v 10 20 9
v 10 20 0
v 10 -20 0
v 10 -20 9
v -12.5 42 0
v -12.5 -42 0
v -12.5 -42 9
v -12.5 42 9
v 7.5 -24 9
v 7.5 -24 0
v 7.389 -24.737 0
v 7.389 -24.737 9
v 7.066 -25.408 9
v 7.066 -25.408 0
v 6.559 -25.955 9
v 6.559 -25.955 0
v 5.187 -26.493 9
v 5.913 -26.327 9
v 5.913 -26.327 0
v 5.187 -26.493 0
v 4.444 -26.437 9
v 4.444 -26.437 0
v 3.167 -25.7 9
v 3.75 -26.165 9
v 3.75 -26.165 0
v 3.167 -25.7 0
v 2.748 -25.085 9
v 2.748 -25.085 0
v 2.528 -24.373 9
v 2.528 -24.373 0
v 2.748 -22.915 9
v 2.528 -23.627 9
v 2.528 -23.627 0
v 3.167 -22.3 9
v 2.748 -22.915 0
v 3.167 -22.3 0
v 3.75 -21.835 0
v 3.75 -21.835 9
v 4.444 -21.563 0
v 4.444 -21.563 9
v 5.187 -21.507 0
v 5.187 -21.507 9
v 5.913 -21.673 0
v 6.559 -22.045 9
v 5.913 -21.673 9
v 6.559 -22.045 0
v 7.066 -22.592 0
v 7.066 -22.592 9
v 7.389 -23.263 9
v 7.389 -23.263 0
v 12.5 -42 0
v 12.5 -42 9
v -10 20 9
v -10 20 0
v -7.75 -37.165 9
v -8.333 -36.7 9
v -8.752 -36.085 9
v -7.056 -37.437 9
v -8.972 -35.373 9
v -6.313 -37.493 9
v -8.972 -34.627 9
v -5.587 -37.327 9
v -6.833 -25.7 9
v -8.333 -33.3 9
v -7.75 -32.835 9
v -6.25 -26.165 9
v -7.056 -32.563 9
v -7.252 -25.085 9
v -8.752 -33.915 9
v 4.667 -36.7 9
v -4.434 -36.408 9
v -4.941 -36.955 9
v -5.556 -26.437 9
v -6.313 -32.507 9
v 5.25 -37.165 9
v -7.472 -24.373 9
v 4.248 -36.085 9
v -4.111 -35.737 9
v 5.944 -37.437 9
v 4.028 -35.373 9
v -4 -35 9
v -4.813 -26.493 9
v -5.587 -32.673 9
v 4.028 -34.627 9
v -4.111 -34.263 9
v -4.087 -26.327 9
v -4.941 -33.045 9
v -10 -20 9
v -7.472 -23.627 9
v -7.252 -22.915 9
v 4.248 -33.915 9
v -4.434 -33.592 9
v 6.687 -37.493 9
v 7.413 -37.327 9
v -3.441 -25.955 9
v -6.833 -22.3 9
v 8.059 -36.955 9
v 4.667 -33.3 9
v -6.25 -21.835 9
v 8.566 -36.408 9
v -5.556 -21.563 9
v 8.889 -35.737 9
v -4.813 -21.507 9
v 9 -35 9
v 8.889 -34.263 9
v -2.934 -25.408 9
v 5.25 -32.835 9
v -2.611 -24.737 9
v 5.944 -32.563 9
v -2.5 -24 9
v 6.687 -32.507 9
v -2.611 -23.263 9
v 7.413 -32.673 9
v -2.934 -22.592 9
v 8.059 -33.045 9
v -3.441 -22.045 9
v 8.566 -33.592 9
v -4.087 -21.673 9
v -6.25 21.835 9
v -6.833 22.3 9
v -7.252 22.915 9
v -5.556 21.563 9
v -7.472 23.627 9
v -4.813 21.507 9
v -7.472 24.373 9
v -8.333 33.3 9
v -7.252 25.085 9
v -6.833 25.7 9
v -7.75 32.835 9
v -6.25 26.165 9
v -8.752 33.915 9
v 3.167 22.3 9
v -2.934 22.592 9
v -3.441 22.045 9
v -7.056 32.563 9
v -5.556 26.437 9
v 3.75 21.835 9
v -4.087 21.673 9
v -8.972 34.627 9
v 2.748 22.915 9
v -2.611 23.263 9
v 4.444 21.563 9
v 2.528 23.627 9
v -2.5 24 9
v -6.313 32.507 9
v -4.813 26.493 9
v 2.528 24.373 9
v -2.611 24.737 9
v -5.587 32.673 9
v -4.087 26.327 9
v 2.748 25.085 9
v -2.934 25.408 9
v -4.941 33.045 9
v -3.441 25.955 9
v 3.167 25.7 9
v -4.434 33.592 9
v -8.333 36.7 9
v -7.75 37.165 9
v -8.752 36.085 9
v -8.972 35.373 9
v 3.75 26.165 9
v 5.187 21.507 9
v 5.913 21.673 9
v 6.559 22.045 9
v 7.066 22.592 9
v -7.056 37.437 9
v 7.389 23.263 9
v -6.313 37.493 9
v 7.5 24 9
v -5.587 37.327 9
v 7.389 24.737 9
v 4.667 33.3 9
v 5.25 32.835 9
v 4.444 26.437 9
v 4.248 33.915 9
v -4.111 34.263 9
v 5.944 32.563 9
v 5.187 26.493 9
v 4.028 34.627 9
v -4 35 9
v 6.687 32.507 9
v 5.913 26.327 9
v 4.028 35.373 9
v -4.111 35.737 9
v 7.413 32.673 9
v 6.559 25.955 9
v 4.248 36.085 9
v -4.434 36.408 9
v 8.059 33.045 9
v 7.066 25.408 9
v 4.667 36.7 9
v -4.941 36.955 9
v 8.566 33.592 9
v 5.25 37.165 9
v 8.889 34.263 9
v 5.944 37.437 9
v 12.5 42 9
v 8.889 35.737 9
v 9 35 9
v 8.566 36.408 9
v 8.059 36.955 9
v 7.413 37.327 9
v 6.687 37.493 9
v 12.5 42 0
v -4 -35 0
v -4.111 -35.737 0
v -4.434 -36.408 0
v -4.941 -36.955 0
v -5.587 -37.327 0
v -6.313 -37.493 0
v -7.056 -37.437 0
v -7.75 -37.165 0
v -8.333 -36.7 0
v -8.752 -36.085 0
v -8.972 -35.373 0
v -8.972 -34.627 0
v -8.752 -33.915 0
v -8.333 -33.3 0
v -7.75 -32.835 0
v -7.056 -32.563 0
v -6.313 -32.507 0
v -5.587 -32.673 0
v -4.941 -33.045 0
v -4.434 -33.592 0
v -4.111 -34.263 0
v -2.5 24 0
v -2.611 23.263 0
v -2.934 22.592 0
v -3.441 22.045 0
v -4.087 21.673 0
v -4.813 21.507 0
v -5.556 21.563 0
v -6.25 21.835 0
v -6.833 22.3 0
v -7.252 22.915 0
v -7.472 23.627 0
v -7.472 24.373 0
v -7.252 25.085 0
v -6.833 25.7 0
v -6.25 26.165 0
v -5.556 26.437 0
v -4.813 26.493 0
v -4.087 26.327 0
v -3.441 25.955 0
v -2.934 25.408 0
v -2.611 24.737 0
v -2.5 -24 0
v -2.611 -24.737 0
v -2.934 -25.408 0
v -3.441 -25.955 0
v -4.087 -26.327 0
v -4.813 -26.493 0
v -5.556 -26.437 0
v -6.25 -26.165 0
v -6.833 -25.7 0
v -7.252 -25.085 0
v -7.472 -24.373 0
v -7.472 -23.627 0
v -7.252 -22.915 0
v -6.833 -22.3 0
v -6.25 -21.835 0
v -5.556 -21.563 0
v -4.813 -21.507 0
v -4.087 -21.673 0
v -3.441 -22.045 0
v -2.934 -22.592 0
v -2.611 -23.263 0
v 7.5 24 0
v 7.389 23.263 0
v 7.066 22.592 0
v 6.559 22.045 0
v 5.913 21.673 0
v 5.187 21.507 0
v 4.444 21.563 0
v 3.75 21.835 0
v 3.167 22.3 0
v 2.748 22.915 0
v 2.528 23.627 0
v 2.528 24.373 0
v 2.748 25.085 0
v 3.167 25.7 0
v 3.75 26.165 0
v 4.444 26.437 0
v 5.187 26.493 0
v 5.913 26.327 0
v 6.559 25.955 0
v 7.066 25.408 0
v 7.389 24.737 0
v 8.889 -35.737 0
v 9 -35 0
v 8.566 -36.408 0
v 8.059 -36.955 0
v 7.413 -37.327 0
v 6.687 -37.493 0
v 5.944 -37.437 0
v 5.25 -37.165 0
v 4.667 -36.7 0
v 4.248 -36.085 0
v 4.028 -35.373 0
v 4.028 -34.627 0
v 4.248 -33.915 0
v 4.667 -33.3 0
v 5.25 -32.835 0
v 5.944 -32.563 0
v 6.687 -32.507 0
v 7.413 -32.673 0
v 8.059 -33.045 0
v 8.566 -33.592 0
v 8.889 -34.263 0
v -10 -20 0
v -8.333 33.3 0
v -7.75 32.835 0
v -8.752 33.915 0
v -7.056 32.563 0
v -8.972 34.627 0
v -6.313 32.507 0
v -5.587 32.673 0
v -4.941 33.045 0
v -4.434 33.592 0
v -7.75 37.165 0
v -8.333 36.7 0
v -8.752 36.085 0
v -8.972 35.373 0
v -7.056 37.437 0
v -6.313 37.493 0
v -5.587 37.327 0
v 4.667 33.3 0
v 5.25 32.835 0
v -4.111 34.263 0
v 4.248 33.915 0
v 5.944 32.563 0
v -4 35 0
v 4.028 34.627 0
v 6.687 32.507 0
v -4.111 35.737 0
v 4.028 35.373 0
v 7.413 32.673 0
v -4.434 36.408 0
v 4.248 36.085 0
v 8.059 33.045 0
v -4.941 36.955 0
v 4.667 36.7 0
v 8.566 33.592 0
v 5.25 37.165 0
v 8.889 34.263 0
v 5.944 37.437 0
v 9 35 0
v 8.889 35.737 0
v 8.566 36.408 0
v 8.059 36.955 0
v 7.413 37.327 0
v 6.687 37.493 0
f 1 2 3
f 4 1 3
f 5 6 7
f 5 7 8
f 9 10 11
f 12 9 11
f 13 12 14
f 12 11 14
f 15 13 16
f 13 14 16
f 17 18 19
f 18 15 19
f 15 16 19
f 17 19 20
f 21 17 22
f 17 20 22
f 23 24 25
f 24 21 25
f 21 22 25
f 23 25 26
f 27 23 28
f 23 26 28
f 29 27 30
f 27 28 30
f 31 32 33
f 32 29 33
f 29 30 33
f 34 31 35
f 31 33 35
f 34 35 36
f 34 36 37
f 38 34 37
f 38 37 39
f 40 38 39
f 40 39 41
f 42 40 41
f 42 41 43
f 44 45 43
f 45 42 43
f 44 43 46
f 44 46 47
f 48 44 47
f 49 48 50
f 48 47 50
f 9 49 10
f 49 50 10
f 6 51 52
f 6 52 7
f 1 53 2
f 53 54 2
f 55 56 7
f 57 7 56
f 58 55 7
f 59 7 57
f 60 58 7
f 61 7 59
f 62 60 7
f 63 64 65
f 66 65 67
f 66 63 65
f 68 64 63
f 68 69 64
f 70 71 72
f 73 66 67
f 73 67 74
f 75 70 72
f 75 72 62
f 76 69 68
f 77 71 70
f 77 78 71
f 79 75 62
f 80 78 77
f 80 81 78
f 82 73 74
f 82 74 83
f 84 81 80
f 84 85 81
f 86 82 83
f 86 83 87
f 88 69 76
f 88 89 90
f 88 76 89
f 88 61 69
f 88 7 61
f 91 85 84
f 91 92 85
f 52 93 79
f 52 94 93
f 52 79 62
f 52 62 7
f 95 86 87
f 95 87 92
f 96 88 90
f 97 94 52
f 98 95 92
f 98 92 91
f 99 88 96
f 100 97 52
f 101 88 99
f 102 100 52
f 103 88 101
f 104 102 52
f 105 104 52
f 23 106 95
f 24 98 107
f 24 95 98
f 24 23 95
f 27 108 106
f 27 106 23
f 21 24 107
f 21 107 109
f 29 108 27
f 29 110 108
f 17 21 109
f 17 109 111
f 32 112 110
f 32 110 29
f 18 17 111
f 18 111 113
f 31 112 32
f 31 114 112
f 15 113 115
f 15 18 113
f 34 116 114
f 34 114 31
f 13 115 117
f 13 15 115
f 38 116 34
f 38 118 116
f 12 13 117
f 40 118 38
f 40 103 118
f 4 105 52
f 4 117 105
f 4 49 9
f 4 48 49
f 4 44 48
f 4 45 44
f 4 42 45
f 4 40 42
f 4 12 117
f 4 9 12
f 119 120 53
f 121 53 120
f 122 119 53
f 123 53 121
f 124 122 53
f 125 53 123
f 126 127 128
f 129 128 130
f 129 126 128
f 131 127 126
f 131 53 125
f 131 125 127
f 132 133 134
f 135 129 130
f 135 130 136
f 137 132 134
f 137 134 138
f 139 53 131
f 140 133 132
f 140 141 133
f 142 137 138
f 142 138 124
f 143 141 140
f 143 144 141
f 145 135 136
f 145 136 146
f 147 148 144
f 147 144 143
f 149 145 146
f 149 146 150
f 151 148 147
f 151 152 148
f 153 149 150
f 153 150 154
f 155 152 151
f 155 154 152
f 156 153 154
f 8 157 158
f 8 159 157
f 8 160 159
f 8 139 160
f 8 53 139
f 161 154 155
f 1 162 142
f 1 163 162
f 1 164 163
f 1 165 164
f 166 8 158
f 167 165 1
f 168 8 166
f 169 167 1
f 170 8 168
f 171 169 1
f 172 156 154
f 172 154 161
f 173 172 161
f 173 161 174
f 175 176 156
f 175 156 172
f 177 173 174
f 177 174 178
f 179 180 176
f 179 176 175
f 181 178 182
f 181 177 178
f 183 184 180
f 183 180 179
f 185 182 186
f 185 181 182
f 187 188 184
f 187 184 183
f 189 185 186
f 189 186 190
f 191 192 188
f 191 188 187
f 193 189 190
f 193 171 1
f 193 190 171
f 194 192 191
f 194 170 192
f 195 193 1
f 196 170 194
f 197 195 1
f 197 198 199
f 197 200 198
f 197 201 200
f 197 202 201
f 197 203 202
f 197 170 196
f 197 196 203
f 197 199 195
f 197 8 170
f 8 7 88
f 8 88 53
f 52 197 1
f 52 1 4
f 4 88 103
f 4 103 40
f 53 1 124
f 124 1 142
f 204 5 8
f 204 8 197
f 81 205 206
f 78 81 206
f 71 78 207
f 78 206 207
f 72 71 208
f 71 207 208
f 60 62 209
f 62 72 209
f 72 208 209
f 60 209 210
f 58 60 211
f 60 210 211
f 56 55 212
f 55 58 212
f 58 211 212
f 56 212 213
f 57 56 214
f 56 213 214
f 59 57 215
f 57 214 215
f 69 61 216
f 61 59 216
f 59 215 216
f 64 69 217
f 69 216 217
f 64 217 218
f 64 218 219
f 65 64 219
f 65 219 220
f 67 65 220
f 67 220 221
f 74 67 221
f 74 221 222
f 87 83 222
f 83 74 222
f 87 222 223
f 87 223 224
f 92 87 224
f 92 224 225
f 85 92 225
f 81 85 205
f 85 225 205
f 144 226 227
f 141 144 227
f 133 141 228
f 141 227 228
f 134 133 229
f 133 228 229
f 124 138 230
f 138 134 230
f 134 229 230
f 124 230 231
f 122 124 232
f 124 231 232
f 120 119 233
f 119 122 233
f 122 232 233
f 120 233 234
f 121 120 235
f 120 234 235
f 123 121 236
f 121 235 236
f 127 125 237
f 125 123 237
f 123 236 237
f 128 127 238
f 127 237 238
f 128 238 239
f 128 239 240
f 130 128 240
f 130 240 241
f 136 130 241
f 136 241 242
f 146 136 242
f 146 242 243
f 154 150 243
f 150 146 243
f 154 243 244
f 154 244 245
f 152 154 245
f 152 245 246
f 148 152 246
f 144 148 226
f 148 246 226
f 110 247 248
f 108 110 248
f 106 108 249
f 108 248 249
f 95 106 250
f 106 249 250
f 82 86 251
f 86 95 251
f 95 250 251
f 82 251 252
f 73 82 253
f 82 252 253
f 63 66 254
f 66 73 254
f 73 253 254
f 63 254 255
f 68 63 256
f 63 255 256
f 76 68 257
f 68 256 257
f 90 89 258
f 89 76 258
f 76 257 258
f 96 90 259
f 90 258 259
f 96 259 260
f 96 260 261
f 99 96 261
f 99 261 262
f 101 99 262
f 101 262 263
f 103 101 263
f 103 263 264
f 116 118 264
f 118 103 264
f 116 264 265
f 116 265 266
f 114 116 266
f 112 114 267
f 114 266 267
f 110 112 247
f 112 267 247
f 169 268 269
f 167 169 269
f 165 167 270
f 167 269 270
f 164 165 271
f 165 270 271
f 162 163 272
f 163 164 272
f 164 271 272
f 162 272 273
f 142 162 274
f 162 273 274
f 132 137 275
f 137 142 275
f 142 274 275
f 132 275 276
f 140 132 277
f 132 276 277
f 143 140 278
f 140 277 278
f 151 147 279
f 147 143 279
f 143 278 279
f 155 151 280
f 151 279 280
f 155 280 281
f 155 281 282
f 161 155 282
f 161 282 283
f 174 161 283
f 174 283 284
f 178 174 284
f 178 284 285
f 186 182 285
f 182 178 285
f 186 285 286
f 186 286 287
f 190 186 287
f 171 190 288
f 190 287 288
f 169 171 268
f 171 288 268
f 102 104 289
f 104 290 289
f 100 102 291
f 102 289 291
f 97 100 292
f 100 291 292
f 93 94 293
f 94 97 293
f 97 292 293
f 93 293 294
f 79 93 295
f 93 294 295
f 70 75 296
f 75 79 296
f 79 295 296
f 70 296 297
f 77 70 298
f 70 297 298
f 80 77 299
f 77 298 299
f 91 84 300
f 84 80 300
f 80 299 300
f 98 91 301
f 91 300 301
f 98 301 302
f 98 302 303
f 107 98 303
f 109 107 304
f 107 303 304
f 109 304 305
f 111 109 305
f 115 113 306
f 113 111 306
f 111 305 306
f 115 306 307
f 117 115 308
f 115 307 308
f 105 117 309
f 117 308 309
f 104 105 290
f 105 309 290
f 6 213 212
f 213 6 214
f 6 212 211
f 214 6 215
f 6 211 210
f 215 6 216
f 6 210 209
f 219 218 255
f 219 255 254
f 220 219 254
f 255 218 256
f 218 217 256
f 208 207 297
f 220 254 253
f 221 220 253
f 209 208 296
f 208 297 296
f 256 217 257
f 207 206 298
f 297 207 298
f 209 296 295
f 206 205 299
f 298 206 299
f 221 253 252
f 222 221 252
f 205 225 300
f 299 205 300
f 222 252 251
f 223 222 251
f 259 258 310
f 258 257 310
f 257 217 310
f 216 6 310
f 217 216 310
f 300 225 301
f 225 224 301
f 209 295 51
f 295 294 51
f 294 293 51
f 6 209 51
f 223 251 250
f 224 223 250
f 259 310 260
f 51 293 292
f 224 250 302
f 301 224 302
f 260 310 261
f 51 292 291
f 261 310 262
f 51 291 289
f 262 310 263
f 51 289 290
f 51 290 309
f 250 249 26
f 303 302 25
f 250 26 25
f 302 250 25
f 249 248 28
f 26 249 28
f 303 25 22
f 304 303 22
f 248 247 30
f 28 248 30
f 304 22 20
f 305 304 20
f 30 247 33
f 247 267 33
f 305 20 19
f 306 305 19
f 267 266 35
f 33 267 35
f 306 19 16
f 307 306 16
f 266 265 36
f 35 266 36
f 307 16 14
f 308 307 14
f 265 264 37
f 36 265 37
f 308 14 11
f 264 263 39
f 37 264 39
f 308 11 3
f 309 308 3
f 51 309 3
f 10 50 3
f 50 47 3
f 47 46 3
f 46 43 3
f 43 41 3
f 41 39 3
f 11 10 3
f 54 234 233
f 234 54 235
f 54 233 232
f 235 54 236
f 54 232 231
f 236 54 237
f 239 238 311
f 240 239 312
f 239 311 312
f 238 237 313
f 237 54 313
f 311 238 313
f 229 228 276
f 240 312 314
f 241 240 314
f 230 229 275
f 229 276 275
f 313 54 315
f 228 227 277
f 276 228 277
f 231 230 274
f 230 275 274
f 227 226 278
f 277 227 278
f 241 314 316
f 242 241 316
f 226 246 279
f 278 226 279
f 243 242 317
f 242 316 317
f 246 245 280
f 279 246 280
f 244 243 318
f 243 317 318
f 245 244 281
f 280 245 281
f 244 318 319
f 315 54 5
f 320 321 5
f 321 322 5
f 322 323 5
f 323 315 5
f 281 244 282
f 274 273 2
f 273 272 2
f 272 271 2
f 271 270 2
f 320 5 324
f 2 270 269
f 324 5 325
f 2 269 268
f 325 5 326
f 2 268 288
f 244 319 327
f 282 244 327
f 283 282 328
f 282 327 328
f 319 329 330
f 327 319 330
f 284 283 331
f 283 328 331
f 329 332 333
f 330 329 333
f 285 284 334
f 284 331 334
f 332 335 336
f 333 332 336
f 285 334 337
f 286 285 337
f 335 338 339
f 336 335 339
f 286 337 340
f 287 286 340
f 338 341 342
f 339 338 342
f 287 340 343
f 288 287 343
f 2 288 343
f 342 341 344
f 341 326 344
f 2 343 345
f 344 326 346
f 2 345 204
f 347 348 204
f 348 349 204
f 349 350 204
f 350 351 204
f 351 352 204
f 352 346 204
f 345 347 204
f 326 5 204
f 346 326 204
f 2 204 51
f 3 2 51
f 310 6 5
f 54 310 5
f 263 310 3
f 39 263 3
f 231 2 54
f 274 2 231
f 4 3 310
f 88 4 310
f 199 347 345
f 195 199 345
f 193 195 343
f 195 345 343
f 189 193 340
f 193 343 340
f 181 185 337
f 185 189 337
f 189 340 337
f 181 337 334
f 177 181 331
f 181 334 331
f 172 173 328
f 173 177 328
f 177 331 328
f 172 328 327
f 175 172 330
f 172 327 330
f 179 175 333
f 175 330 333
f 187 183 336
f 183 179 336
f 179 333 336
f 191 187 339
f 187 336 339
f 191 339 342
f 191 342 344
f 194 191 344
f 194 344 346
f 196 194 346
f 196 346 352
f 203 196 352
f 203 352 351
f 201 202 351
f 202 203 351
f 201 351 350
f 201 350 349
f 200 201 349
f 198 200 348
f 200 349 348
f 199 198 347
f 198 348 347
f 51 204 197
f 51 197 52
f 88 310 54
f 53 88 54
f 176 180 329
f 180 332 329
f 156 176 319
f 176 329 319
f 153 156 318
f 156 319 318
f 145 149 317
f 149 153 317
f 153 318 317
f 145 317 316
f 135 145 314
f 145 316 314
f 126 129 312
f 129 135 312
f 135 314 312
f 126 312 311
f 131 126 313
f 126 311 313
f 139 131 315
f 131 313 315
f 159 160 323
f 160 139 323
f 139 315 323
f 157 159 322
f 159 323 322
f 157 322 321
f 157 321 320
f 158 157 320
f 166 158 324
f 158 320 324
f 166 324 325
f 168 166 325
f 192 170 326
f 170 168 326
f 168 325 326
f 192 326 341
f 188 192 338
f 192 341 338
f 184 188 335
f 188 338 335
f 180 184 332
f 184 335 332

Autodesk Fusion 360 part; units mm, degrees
sketch "Sketch1" plane through (0, 0, 0) normal (0, 0, 1) x (1, 0, 0)
  line L0 (12.5, -42) -> (-12.5, -42)
  line L1 (-12.5, -42) -> (-12.5, 42)
  line L2 (-12.5, 42) -> (12.5, 42)
  line L3 (12.5, 42) -> (12.5, -42)
  line L4 (12.5, -42) -> (-12.5, 42) construction
  line L5 (-12.5, -42) -> (12.5, 42) construction
  line L6 (10, -20) -> (-10, -20)
  line L7 (-10, -20) -> (-10, 20)
  line L8 (-10, 20) -> (10, 20)
  line L9 (10, 20) -> (10, -20)
  line L10 (10, -20) -> (-10, 20) construction
  line L11 (-10, -20) -> (10, 20) construction
  circle A0 centre (5, -24) radius 2.5
  circle A1 centre (-5, -24) radius 2.5
  line L12 (0, 0) -> (5, 0) construction
  circle A2 centre (5, 24) radius 2.5
  circle A3 centre (-5, 24) radius 2.5
  circle A4 centre (6.5, 35) radius 2.5
  circle A5 centre (-6.5, 35) radius 2.5
  circle A6 centre (6.5, -35) radius 2.5
  circle A7 centre (-6.5, -35) radius 2.5
  dimension "d1" = 84
  dimension "d2" = 25
  dimension "d3" = 40
  dimension "d4" = 20
  dimension "d5" = 5
  dimension "d6" = 5
  dimension "d7" = 18
  dimension "d8" = 18
  dimension "d9" = 5
  dimension "d10" = 10
  dimension "d11" = 5
  dimension "d12" = 5
  dimension "d13" = 6
  dimension "d14" = 7
  dimension "d15" = 13
  dimension "d16" = 7
extrude "Extrude1" add sketch "Sketch1" along normal blind 9
